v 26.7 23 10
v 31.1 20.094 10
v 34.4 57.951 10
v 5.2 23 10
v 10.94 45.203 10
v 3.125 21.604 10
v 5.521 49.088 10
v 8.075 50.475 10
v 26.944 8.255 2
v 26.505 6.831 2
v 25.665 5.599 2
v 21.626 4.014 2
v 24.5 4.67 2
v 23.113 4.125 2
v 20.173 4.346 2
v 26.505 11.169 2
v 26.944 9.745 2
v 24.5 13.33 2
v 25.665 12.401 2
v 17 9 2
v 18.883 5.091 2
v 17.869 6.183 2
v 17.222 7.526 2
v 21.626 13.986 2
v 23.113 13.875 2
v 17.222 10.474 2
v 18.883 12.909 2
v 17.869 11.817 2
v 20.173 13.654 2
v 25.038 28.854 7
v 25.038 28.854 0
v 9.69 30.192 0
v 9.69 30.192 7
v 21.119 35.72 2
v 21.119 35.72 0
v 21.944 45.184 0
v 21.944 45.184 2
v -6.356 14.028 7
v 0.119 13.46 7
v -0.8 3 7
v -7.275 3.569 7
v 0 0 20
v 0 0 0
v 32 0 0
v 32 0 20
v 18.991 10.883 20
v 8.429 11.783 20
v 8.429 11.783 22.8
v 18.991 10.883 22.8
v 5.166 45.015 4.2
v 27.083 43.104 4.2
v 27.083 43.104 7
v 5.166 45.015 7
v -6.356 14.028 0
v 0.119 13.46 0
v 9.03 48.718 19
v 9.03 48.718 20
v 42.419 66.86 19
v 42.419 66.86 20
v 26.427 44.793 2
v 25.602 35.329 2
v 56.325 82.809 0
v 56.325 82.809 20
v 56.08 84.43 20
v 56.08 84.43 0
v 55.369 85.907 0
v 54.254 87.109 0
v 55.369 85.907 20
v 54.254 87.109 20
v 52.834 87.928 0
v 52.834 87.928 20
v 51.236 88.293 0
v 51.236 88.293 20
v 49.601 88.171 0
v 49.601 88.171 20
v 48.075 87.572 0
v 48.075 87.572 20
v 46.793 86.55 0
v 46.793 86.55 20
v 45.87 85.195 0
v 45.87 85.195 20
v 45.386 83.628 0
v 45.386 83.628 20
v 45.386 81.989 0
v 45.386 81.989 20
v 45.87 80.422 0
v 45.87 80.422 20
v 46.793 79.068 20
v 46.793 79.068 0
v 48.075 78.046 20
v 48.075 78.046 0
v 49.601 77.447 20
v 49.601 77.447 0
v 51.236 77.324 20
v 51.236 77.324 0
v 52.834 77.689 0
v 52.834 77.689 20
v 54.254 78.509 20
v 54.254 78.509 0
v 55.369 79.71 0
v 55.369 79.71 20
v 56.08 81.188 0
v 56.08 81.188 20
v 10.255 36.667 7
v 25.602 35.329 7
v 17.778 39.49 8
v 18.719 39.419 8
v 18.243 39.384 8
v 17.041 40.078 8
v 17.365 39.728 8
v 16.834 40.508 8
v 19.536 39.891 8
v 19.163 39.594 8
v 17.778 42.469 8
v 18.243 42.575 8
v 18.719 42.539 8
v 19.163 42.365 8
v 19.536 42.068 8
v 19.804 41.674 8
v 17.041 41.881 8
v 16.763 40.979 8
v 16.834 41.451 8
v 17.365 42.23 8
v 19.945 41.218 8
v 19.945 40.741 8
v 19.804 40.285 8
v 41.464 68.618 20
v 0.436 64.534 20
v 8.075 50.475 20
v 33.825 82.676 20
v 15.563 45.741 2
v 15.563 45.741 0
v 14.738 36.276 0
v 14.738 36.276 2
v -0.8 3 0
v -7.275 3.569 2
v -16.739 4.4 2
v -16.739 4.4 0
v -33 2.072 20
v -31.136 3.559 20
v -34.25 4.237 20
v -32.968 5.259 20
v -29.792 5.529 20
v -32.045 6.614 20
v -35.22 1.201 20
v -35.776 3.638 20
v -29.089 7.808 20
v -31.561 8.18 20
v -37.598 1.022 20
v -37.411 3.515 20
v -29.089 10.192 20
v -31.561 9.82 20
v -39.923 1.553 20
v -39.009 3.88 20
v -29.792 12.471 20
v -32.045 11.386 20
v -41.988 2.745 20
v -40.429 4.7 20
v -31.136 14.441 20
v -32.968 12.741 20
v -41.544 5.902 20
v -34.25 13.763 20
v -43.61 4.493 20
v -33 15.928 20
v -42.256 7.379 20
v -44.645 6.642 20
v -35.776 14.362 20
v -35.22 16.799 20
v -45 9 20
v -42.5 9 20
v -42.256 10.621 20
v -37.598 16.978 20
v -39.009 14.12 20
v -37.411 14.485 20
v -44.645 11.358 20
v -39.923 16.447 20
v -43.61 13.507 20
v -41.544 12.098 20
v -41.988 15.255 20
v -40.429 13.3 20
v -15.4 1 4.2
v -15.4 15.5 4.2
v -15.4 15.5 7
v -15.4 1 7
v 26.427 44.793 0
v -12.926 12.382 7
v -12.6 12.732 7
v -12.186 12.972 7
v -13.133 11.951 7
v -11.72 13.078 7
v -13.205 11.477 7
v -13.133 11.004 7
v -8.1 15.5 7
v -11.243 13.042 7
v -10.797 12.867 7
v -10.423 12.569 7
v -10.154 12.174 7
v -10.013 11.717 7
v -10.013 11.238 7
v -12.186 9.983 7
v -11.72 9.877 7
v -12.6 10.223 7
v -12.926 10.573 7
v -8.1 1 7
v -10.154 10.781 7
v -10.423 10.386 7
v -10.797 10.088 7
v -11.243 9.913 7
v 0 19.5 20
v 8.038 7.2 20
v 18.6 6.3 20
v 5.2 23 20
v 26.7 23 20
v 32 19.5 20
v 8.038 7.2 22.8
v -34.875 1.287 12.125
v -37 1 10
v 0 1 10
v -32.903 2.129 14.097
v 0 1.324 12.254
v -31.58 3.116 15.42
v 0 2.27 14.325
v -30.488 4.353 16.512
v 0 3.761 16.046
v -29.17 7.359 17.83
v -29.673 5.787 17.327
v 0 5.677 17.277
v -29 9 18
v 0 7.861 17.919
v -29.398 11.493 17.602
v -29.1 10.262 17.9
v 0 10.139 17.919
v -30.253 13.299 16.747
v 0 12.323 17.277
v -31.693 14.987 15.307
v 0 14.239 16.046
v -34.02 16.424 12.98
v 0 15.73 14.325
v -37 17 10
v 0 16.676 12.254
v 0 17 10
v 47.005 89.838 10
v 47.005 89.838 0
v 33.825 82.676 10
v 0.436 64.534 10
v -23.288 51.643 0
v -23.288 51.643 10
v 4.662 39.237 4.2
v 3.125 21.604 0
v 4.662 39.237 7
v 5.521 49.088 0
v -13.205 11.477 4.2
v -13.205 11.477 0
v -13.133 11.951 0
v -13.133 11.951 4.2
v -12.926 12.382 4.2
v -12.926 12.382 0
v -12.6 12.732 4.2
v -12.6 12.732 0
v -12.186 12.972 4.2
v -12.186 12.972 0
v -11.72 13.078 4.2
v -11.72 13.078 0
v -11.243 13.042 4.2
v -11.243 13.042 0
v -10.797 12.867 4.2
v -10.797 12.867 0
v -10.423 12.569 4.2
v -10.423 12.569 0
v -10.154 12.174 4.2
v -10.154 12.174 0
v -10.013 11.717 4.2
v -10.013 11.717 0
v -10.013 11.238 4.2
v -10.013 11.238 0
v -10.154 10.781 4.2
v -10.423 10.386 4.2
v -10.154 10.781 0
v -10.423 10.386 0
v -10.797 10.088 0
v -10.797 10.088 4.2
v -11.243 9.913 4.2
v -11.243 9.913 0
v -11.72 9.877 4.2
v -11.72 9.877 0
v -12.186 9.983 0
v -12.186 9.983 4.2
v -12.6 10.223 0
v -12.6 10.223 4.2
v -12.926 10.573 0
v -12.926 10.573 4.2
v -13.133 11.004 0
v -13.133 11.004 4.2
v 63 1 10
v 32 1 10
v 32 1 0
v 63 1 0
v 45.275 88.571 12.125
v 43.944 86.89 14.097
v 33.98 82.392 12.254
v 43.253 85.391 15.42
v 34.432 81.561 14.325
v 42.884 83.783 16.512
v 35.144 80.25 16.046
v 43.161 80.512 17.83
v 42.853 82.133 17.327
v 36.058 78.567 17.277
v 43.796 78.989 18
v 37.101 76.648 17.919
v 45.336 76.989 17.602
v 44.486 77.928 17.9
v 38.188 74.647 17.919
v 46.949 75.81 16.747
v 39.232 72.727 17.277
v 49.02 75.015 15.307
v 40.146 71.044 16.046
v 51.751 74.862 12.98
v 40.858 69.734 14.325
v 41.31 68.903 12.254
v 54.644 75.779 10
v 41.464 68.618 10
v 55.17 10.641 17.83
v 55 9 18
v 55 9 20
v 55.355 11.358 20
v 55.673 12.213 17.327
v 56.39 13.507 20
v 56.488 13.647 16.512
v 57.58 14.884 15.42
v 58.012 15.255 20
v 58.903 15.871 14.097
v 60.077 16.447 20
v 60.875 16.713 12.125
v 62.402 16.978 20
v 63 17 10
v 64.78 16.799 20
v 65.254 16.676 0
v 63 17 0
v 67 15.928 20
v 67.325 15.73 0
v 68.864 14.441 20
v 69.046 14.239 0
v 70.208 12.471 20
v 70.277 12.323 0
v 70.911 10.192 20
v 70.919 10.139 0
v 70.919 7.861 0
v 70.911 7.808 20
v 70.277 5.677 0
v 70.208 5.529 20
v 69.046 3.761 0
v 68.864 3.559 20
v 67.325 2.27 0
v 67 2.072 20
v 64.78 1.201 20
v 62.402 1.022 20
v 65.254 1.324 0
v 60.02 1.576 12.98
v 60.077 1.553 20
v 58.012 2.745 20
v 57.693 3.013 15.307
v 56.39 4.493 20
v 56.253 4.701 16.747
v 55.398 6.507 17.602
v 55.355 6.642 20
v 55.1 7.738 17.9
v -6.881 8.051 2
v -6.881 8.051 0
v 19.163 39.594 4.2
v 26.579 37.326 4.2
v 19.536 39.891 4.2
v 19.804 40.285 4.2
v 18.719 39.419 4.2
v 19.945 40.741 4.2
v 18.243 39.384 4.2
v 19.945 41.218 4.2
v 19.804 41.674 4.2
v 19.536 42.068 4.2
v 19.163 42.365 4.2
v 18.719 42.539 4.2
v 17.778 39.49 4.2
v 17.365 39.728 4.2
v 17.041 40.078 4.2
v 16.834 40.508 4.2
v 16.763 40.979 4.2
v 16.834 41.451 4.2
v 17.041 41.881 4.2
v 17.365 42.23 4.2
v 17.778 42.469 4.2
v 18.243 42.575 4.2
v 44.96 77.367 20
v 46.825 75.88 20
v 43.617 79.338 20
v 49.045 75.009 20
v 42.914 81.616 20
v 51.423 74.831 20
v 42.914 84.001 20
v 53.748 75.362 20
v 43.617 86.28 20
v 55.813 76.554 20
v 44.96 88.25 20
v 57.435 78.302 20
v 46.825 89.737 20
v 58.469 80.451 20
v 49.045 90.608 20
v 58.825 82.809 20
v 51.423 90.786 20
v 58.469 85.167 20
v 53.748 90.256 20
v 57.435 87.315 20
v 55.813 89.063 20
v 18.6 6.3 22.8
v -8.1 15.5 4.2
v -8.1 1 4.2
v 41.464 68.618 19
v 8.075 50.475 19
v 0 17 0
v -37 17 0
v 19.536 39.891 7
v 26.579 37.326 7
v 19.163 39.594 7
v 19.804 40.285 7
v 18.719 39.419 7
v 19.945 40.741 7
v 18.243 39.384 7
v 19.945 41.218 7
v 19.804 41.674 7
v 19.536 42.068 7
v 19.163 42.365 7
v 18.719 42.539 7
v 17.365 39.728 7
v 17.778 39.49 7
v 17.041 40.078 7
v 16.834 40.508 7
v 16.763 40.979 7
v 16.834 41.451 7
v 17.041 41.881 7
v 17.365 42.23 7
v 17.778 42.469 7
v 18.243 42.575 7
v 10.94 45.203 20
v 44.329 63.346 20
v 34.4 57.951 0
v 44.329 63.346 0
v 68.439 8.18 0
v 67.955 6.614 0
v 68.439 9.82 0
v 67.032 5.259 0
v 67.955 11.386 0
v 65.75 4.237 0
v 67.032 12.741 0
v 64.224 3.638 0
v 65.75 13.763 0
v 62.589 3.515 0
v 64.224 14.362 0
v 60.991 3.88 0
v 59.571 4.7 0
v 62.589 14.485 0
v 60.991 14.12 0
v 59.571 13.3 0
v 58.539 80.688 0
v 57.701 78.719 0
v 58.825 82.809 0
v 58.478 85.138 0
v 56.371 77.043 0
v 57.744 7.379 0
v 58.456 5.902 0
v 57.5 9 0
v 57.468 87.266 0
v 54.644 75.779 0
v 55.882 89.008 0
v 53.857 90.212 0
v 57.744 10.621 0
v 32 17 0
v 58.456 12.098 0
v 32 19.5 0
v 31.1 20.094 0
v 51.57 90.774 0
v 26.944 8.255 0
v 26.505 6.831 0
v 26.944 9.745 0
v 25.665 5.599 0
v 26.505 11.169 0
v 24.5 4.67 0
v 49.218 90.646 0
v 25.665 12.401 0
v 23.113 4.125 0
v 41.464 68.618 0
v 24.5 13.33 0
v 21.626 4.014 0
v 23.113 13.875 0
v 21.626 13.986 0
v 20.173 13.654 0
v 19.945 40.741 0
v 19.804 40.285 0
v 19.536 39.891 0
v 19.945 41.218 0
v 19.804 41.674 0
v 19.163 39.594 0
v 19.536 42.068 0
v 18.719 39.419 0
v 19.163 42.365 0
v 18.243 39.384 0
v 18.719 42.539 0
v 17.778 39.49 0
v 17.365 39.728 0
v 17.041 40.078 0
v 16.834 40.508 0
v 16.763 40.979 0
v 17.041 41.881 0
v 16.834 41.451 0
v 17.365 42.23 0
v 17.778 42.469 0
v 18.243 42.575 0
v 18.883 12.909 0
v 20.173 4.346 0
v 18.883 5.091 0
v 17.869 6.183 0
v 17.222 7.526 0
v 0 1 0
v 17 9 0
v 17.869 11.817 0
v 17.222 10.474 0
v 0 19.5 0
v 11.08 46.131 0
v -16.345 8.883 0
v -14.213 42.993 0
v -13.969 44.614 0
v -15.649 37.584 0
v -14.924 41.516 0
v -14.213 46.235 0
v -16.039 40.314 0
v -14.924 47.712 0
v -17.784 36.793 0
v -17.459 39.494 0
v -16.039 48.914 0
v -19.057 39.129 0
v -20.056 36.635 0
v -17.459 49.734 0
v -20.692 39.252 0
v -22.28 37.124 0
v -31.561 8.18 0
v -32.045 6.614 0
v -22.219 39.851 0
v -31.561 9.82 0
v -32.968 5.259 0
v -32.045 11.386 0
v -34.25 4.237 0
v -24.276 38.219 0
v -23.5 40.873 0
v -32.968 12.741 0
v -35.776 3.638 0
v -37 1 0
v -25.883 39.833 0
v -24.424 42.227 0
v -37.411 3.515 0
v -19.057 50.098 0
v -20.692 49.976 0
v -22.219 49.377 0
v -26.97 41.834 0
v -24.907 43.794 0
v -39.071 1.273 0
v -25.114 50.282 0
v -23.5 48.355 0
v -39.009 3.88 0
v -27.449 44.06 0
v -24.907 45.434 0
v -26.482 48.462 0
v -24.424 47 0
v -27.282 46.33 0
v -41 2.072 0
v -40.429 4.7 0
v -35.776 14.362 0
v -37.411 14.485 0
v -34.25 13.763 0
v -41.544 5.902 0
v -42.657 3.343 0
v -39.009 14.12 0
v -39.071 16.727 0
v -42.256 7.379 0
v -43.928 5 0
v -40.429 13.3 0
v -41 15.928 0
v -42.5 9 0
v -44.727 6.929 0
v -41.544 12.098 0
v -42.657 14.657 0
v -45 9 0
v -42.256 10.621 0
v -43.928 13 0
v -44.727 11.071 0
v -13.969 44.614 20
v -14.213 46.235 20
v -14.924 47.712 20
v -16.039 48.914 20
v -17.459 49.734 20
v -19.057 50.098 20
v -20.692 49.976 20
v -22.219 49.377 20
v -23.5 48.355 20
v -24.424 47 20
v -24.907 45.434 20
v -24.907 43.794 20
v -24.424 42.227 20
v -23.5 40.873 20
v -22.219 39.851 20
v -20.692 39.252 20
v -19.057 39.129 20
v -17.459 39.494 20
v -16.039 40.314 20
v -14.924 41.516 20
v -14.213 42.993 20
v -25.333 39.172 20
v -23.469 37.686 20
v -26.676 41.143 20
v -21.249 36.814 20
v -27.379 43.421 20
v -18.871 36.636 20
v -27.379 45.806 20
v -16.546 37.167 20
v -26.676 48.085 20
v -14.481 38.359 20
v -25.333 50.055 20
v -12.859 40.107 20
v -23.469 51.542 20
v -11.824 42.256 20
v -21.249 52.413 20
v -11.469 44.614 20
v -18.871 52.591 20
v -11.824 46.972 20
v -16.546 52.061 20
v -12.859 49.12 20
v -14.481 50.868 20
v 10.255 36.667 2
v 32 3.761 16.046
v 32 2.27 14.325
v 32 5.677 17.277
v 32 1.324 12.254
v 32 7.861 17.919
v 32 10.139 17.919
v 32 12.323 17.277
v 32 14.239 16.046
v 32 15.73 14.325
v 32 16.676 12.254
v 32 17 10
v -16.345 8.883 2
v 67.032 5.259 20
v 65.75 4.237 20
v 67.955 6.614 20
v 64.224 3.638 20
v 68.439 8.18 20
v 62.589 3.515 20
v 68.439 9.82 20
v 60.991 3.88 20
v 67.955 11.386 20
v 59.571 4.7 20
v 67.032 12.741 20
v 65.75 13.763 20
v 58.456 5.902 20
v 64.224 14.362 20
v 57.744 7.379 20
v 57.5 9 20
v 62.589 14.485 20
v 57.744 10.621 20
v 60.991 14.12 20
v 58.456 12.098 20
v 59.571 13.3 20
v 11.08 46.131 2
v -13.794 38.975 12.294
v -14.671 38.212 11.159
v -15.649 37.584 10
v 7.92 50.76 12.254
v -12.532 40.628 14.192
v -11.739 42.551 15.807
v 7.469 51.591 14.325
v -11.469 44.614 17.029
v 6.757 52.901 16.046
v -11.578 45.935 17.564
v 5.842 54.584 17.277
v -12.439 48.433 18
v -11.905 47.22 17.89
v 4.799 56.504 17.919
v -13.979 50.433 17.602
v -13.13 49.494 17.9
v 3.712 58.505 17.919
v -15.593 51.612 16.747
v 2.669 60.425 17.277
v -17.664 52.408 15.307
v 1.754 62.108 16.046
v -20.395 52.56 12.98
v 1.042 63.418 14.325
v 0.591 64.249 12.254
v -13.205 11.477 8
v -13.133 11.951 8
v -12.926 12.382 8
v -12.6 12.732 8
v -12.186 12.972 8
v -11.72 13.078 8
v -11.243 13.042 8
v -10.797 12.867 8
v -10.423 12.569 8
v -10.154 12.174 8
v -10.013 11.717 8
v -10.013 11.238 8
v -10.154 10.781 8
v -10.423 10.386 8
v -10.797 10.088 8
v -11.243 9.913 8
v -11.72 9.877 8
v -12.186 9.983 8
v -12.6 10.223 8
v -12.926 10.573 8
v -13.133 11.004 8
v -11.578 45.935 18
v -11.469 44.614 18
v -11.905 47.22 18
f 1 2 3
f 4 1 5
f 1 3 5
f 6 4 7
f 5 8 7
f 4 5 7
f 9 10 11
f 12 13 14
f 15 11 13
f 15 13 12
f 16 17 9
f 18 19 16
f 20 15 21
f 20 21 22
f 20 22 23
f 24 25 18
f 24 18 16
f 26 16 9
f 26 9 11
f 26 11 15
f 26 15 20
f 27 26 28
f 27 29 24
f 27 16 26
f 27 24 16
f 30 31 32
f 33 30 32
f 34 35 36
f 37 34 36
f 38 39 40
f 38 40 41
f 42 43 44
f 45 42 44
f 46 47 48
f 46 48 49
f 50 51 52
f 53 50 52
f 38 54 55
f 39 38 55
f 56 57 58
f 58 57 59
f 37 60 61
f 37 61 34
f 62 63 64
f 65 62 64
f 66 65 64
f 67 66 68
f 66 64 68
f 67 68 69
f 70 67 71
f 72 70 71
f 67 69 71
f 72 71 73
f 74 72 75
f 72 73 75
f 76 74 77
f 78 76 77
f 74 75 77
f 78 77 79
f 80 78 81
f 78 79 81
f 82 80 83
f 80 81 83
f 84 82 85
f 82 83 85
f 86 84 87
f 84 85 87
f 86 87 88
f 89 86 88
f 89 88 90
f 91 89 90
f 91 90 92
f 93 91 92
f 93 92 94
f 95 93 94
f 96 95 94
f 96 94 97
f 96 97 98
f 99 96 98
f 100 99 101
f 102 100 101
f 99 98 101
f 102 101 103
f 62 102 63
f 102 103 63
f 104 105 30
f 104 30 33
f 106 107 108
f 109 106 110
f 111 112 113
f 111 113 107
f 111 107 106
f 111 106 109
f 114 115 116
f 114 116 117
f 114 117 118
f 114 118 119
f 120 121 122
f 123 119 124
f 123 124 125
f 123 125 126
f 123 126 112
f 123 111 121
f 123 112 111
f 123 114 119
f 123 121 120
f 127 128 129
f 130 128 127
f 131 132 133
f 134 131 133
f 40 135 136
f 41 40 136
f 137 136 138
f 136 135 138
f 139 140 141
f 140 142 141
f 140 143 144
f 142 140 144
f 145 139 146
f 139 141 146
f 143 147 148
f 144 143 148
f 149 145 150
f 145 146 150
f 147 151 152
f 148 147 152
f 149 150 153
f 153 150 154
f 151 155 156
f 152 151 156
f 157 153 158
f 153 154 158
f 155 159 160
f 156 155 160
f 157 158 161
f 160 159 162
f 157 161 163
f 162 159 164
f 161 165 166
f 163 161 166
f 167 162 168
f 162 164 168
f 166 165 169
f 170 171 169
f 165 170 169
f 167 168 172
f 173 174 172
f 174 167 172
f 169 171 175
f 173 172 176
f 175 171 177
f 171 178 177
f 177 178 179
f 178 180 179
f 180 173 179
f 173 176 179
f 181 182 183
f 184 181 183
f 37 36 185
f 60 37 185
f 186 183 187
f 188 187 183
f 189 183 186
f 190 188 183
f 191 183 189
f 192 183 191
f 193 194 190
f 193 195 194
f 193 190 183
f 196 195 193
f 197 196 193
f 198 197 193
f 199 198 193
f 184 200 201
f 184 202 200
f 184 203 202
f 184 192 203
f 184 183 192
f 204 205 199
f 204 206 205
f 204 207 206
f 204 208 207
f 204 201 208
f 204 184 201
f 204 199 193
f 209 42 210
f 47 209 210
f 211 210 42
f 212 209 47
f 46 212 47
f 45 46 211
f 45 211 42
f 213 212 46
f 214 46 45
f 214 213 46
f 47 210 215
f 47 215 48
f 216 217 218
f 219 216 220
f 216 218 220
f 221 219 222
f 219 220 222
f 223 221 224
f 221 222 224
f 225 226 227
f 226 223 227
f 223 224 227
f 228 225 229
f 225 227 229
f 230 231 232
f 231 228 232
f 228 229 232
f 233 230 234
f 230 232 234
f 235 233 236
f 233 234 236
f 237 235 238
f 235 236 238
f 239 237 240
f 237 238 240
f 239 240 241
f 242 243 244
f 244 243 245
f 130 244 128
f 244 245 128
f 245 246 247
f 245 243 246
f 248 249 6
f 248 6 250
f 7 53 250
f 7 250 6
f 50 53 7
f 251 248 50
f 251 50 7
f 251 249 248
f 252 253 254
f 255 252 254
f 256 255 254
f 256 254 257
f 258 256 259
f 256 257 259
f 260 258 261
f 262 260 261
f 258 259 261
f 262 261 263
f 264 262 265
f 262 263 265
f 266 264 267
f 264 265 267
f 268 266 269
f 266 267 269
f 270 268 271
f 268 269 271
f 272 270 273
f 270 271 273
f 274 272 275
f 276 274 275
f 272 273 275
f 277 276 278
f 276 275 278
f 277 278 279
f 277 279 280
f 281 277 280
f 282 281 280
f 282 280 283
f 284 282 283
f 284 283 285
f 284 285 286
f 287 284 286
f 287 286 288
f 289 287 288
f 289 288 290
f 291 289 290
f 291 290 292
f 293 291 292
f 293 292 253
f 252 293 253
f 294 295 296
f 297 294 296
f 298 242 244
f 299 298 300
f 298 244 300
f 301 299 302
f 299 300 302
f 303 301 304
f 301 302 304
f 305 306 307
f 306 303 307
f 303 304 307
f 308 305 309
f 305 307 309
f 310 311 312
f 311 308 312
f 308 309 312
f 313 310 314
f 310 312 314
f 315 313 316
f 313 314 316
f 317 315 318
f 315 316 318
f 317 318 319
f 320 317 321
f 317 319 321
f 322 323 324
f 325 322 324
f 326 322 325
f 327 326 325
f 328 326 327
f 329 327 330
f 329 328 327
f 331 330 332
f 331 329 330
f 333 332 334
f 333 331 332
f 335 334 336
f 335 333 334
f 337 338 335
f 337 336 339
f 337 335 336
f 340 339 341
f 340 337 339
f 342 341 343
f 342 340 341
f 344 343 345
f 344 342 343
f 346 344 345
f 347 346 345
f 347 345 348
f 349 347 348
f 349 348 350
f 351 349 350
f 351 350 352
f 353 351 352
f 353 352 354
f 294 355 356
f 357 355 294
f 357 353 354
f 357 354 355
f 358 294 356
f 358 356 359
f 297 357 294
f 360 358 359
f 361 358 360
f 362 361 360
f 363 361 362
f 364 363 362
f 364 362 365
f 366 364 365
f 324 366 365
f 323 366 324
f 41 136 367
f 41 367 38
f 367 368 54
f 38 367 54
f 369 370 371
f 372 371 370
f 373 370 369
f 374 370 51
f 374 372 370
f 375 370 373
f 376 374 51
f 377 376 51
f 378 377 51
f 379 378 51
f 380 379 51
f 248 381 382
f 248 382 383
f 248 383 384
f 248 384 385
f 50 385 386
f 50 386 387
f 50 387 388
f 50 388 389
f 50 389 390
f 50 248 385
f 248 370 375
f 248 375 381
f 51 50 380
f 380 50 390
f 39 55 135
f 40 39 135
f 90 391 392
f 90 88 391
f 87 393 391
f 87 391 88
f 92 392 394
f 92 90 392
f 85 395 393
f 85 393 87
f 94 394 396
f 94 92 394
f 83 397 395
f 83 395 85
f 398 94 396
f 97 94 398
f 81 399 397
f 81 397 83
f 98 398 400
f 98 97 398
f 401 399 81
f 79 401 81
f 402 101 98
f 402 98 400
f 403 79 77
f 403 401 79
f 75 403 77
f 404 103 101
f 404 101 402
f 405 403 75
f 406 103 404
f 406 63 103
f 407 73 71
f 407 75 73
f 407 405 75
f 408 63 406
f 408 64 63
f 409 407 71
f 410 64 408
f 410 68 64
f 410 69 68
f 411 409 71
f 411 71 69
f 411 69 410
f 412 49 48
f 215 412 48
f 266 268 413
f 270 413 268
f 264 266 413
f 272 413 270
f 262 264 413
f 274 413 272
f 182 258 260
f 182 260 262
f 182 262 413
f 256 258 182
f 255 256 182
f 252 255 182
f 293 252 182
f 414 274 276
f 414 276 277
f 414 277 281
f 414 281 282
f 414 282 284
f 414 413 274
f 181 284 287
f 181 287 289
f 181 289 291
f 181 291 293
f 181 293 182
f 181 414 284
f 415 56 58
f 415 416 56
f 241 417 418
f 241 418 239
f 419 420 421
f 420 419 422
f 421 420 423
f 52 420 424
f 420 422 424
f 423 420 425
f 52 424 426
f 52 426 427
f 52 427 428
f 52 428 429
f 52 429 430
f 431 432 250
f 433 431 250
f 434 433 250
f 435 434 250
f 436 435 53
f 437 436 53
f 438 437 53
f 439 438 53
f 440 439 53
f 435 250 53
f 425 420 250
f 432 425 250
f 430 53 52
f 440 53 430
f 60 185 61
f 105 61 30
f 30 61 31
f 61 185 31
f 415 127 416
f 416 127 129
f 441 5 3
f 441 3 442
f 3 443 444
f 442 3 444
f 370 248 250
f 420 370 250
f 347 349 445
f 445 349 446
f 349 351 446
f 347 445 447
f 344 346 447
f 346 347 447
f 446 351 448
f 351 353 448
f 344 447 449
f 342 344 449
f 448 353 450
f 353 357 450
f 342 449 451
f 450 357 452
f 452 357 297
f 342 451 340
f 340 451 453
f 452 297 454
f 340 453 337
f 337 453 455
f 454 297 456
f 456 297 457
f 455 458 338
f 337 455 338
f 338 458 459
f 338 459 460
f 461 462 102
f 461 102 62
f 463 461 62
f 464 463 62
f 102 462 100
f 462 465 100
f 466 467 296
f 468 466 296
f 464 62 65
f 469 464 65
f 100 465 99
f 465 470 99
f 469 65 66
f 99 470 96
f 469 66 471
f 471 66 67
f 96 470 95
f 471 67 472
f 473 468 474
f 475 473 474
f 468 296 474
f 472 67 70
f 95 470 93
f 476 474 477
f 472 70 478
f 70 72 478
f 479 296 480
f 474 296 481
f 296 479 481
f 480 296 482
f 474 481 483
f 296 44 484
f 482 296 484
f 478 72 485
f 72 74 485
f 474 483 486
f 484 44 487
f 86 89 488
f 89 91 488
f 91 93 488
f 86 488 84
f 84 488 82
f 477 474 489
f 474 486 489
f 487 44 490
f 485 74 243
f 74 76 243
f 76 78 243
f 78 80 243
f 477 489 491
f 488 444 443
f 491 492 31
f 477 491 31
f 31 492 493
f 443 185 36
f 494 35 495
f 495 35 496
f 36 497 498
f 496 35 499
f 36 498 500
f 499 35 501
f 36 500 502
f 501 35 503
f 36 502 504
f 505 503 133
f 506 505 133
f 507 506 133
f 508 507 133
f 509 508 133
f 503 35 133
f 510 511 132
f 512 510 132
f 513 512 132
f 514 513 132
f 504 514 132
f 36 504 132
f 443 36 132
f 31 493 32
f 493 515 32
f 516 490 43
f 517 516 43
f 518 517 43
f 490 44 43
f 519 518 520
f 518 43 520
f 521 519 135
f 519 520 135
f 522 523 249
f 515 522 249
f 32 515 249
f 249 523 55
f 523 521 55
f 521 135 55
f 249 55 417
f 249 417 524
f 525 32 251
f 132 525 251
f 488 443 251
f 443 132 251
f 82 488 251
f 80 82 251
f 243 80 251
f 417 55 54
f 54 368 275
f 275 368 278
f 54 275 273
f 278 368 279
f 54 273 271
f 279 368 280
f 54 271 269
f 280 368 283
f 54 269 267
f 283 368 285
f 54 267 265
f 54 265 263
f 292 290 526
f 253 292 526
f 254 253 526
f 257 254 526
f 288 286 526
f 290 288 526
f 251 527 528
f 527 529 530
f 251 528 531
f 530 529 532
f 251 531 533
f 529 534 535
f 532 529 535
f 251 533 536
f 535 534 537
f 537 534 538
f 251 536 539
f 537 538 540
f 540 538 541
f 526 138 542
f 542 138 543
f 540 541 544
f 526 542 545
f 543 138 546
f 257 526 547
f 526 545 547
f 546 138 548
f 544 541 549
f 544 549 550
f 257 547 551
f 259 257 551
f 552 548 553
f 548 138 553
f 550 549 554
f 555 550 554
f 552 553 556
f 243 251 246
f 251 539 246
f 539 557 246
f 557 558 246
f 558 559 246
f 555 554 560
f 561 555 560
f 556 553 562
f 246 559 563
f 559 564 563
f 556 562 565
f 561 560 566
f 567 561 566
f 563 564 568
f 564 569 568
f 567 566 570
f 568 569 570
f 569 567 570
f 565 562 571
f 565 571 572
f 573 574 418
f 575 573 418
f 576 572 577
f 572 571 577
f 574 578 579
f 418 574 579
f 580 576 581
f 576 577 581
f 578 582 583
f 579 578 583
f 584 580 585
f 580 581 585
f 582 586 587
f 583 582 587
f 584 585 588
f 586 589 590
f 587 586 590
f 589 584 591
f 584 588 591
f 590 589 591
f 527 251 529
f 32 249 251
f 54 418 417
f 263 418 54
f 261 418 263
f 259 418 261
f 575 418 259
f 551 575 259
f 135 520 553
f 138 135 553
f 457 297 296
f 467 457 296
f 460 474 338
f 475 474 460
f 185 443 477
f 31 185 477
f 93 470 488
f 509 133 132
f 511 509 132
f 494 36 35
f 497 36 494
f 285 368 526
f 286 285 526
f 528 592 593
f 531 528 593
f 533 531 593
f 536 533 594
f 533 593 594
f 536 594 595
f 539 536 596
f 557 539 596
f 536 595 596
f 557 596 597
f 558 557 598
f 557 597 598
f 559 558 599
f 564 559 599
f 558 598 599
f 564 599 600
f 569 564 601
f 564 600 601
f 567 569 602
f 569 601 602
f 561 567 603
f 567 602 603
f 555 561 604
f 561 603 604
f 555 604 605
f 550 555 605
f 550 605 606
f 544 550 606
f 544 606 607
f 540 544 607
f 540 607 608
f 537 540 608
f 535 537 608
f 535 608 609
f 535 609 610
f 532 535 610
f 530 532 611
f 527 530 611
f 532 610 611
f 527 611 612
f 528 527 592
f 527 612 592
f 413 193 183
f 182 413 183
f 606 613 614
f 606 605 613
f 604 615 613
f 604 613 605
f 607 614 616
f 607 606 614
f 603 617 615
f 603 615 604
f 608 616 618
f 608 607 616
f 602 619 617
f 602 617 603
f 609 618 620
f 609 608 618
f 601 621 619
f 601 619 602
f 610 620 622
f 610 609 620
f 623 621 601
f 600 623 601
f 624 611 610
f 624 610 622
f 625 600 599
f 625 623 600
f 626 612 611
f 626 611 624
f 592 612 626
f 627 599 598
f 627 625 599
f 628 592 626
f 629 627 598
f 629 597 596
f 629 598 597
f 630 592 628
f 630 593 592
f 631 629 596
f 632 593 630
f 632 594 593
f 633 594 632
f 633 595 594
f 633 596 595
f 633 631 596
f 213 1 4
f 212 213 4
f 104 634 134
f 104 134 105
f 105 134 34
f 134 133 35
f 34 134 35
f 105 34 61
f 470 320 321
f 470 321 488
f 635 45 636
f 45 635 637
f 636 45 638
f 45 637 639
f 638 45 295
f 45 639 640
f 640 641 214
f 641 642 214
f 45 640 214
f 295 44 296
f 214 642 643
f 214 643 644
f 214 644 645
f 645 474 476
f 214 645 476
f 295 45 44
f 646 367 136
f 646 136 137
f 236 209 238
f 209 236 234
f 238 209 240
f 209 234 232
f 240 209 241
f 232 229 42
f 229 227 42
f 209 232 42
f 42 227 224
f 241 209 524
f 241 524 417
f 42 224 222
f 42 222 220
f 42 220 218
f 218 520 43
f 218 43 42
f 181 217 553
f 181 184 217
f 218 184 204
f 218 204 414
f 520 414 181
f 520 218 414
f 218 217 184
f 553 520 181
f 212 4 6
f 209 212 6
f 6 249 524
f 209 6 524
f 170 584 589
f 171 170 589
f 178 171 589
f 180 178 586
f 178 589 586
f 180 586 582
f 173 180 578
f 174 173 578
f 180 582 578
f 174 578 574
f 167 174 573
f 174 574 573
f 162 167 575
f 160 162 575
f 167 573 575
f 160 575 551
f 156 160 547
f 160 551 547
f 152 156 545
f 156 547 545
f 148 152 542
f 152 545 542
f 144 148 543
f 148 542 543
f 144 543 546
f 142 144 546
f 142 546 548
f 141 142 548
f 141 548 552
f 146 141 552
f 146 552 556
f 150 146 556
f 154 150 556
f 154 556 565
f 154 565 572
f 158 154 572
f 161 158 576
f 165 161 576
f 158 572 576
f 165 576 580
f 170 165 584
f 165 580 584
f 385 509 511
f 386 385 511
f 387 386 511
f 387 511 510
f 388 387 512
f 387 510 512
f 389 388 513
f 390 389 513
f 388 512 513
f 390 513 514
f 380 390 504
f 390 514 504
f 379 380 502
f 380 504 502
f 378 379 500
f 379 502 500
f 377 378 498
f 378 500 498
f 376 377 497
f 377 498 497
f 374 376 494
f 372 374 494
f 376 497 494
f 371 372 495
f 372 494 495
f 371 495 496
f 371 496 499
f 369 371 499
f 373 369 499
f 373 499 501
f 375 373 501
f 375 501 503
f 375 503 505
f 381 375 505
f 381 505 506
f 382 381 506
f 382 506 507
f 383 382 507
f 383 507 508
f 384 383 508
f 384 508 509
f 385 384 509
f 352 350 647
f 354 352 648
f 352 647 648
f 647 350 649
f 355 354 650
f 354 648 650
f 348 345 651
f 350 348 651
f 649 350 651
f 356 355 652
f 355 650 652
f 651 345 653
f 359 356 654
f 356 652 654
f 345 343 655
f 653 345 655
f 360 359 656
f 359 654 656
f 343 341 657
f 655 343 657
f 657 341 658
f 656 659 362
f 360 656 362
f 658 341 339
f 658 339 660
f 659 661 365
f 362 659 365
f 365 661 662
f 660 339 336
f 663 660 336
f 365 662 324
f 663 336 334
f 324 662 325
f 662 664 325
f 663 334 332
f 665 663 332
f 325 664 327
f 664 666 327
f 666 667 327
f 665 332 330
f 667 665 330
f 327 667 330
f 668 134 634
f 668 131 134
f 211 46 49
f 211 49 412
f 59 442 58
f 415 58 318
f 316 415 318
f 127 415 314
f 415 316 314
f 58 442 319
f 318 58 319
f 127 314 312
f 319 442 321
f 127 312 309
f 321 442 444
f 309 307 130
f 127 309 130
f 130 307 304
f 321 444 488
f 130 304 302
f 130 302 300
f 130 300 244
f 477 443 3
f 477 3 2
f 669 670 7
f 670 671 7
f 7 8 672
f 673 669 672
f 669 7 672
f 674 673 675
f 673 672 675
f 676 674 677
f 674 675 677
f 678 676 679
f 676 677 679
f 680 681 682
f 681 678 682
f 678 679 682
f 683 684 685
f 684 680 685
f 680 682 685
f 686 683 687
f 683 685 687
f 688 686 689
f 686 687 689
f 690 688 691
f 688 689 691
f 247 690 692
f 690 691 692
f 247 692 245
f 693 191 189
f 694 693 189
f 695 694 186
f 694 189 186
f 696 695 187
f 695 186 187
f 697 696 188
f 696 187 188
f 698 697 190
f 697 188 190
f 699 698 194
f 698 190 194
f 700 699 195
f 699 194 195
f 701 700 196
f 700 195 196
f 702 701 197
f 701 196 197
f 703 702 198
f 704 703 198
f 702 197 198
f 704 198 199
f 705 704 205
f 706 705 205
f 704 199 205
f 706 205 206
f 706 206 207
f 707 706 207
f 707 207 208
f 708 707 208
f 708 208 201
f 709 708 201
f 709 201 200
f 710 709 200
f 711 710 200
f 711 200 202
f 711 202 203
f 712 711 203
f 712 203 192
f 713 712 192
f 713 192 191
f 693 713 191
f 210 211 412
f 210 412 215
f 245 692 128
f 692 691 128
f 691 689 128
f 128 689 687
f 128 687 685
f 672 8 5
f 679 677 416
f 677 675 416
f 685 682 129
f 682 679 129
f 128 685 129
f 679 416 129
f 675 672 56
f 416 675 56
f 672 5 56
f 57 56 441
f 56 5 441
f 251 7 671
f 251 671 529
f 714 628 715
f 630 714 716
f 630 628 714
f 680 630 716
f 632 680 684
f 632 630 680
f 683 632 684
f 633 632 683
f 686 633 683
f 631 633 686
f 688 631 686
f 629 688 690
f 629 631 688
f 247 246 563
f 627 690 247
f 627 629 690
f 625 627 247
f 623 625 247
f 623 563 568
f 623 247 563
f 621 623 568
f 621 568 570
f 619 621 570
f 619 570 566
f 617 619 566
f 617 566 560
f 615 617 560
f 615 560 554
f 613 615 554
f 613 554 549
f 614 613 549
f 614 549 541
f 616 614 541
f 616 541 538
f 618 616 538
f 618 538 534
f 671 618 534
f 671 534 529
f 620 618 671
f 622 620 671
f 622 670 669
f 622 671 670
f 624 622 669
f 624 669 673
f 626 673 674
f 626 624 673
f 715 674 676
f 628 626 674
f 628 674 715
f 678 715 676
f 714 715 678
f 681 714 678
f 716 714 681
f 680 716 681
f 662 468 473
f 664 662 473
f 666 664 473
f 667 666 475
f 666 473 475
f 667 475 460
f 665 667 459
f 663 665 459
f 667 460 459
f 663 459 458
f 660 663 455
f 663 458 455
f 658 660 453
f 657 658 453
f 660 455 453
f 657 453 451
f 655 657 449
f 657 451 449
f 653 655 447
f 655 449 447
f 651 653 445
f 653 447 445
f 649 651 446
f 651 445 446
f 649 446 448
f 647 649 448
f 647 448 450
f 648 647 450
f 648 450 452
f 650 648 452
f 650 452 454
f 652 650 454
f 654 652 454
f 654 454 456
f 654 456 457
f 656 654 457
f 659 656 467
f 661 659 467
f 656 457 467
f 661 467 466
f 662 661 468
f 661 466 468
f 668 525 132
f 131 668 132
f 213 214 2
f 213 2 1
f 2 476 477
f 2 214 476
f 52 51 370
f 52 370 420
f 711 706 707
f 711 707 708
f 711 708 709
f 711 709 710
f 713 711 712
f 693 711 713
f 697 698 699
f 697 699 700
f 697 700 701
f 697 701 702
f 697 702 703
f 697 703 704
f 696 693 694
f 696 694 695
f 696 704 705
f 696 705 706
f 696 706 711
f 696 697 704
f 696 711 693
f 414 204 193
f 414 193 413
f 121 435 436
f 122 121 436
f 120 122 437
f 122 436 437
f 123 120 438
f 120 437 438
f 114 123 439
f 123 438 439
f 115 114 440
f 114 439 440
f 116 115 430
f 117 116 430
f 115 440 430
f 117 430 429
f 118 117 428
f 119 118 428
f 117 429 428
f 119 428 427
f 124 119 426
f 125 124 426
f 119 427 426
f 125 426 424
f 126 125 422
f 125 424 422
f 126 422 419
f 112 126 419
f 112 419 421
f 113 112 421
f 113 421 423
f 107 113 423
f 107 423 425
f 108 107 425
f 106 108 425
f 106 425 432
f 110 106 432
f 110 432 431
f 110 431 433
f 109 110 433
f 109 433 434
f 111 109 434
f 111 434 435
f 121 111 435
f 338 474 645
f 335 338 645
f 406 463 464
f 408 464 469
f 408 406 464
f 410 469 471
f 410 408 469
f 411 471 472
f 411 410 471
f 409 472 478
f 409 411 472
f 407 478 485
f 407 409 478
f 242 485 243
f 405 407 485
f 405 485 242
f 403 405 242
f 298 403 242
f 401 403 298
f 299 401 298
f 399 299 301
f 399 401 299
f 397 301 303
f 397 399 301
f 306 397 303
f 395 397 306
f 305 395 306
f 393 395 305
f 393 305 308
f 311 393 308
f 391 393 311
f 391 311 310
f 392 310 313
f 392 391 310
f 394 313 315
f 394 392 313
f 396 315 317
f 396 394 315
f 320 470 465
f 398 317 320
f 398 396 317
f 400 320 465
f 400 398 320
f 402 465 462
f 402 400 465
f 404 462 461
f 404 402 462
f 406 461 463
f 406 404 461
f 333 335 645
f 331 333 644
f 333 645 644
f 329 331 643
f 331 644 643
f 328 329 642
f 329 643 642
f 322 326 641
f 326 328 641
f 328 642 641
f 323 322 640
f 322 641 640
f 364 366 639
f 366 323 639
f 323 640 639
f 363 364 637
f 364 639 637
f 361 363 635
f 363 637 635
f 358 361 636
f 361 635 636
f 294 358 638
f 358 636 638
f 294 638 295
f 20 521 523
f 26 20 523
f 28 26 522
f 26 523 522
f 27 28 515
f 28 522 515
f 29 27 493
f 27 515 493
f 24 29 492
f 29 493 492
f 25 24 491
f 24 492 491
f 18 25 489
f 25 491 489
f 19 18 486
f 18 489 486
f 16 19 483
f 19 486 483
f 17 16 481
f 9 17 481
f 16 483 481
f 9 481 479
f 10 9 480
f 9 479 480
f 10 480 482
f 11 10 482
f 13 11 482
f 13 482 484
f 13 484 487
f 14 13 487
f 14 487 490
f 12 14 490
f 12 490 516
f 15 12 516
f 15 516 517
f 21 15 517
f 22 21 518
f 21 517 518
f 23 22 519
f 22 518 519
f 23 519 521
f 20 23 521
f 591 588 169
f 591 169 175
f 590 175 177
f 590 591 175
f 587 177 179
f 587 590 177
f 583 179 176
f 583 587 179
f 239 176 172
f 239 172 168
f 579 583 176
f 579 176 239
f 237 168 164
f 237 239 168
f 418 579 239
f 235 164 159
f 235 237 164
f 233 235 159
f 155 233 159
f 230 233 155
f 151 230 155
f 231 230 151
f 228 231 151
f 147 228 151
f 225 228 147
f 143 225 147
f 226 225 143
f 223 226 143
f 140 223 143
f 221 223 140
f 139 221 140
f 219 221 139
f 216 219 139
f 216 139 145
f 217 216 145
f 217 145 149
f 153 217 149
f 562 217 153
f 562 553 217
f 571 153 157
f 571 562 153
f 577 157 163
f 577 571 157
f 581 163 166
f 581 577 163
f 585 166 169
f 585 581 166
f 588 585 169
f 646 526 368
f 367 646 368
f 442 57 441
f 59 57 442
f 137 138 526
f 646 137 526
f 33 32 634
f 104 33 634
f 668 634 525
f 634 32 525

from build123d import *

# Parameters (mm, degrees)
BOSS_EXTRUDE1_DEPTH      = 20
SKETCH2_R                = 8.000000000000012
SKETCH2_R_2              = 5.5000000000000036
BOSS_EXTRUDE2_DEPTH      = 20
SKETCH2_R_3              = 7.999999999999998
SKETCH2_R_4              = 5.4999999999999964
BOSS_EXTRUDE2_2_DEPTH    = 20
BOSS_EXTRUDE3_REACH      = 84.813
BOSS_EXTRUDE3_END_RADIUS = 8.000000000000012
BOSS_EXTRUDE4_REACH      = 79.266
BOSS_EXTRUDE4_END_RADIUS = 7.999999999999998
BOSS_EXTRUDE5_DEPTH      = 10
BOSS_EXTRUDE6_DEPTH      = 20
SKETCH7_R                = 8
SKETCH7_R_2              = 5.499999999999997
BOSS_EXTRUDE7_DEPTH      = 20
SKETCH7_R_3              = 8.000000000000002
SKETCH7_R_4              = 5.500000000000001
BOSS_EXTRUDE7_2_DEPTH    = 20
BOSS_EXTRUDE8_REACH      = 108.8
BOSS_EXTRUDE8_END_RADIUS = 8.000000000000002
BOSS_EXTRUDE9_REACH      = 124.193
BOSS_EXTRUDE9_END_RADIUS = 8
FILLET1_R                = 8
CUT_EXTRUDE1_DEPTH       = 1
BOSS_EXTRUDE10_DEPTH     = 2.8000000000000003
SKETCH12_R               = 5.000000000000001
CUT_EXTRUDE2_DEPTH       = 2
CUT_EXTRUDE3_DEPTH       = 6.999999999999999
CUT_EXTRUDE4_DEPTH       = 2
SKETCH12_7_R             = 1.6049758304520296
SKETCH12_7_R_2           = 1.6000000000000008
CUT_EXTRUDE5_DEPTH       = 8
SKETCH13_W               = 2.8000000000000007
SKETCH13_H               = 5.799999999999997
CUT_EXTRUDE6_DEPTH       = 22.000000000000004
CUT_EXTRUDE7_DEPTH       = 14.499999999999998
CUT_EXTRUDE8_DEPTH       = 14.5


with BuildPart() as part:
    # Sketch1 → Boss-Extrude1 (new body)
    with BuildSketch(Plane.XY):
        Polygon((0, 0), (32, 0), (32, 19.5), (26.699999999999996, 23), (5.2, 22.999999999999996), (-9e-17, 19.5), align=None)
    extrude(amount=BOSS_EXTRUDE1_DEPTH)



with BuildPart() as body_2:
    # Sketch2 → Boss-Extrude2 (new body)
    with BuildSketch(Plane(origin=(0, 0, 0), x_dir=(-1, 0, 0), z_dir=(0, 0, -1))):
        with Locations((-63, 8.999999999999982)):
            Circle(SKETCH2_R)
        with Locations((-63, 8.999999999999982)):
            Circle(SKETCH2_R_2, mode=Mode.SUBTRACT)
    extrude(amount=-BOSS_EXTRUDE2_DEPTH)


with BuildPart() as body_3:
    # Sketch2 → Boss-Extrude2 2 (new body)
    with BuildSketch(Plane(origin=(0, 0, 0), x_dir=(-1, 0, 0), z_dir=(0, 0, -1))):
        with Locations((37.00000000000001, 9.000000000000002)):
            Circle(SKETCH2_R_3)
        with Locations((37.00000000000001, 9.000000000000002)):
            Circle(SKETCH2_R_4, mode=Mode.SUBTRACT)
    extrude(amount=-BOSS_EXTRUDE2_2_DEPTH)


with BuildPart() as part_1:
    add(part.part)

    add(body_2.part)  # Boss-Extrude3 merges body 2
    # Boss-Extrude3: up to this cylinder (the profile starts outside it)
    boss_extrude3_end = Plane(origin=(63, 8.999999999999982, 9), z_dir=(0, 0, -1)) * Cylinder(BOSS_EXTRUDE3_END_RADIUS, 186.62600000000003, mode=Mode.PRIVATE)
    # Sketch4 → Boss-Extrude3 (add, up to the surface)
    with BuildSketch(Plane(origin=(32, 0, 0), x_dir=(0, 0, -1), z_dir=(1, 0, 0)), mode=Mode.PRIVATE) as boss_extrude3_sk1:
        Polygon((0, 17), (-18.000000000000004, 16.999999999999996), (-18, 0.9999999999999974), (2.03e-15, 0.9999999999999996), align=None)
    boss_extrude3_tool1 = extrude(boss_extrude3_sk1.sketch, amount=BOSS_EXTRUDE3_REACH, mode=Mode.PRIVATE) - boss_extrude3_end
    add(boss_extrude3_tool1.solids().sort_by_distance((32, 9, 9))[0])


    add(body_3.part)  # Boss-Extrude4 merges body 3
    # Boss-Extrude4: up to this cylinder (the profile starts outside it)
    boss_extrude4_end = Plane(origin=(-37.00000000000001, 9.000000000000002, 9), z_dir=(0, 0, -1)) * Cylinder(BOSS_EXTRUDE4_END_RADIUS, 175.532, mode=Mode.PRIVATE)
    # Sketch5 → Boss-Extrude4 (add, up to the surface)
    with BuildSketch(Plane.ZY, mode=Mode.PRIVATE) as boss_extrude4_sk1:
        Polygon((0, 17), (18.000000000000004, 17), (18.000000000000007, 1.0000000000000009), (1.96e-15, 1.0000000000000009), align=None)
    boss_extrude4_tool1 = extrude(boss_extrude4_sk1.sketch, amount=BOSS_EXTRUDE4_REACH, mode=Mode.PRIVATE) - boss_extrude4_end
    add(boss_extrude4_tool1.solids().sort_by_distance((0, 9, 9))[0])

    # Sketch6 → Boss-Extrude5 (add)
    with BuildSketch(Plane(origin=(0, 0, 0), x_dir=(-1, 0, 0), z_dir=(0, 0, -1))):
        Polygon((-34.39999999999999, 57.95077896920448), (-31.099999999999998, 20.09433962264151), (-26.699999999999996, 23), (-5.2, 22.999999999999996), (-3.1253837694695172, 21.603623690989096), (-5.978502136601586, 54.33359411944373), (-10.939595247933246, 45.203253371300974), align=None)
    extrude(amount=-BOSS_EXTRUDE5_DEPTH)

    # Sketch6<3> → Boss-Extrude6 (add)
    with BuildSketch(Plane(origin=(0, 0, 0), x_dir=(-1, 0, 0), z_dir=(0, 0, -1))):
        Polygon((-0.4360161035932989, 64.53392395352827), (-10.939595247933246, 45.203253371300974), (-44.328935344507634, 63.34579916606999), (-33.82535620016769, 82.67646974829727), align=None)
    extrude(amount=-BOSS_EXTRUDE6_DEPTH)



with BuildPart() as body_2_2:
    # Sketch7 → Boss-Extrude7 (new body)
    with BuildSketch(Plane.XY.offset(20)):
        with Locations((50.82484219508264, 82.80866622590094)):
            Circle(SKETCH7_R)
        with Locations((50.82484219508264, 82.80866622590094)):
            Circle(SKETCH7_R_2, mode=Mode.SUBTRACT)
    extrude(amount=-BOSS_EXTRUDE7_DEPTH)


with BuildPart() as body_3_2:
    # Sketch7 → Boss-Extrude7 2 (new body)
    with BuildSketch(Plane.XY.offset(20)):
        with Locations((-19.46850537665293, 44.613832973755706)):
            Circle(SKETCH7_R_3)
        with Locations((-19.46850537665293, 44.613832973755706)):
            Circle(SKETCH7_R_4, mode=Mode.SUBTRACT)
    extrude(amount=-BOSS_EXTRUDE7_2_DEPTH)


with BuildPart() as part_2:
    add(part_1.part)

    add(body_3_2.part)  # Boss-Extrude8 merges body 3 2
    # Boss-Extrude8: up to this cylinder (the profile starts outside it)
    boss_extrude8_end = Plane(origin=(-19.46850537665293, 44.613832973755706, 9), z_dir=(0, 0, 1)) * Cylinder(BOSS_EXTRUDE8_END_RADIUS, 234.6, mode=Mode.PRIVATE)
    # Sketch8 → Boss-Extrude8 (add, up to the surface)
    with BuildSketch(Plane(origin=(27.409040149935237, 14.89306960462748, 0), x_dir=(0, 0, 1), z_dir=(-0.8786668446466945, -0.47743541565181535, 0)), mode=Mode.PRIVATE) as boss_extrude8_sk1:
        Polygon((0, 56.49564980326649), (18.000000000000004, 56.49564980326649), (18.000000000000007, 40.49564980326649), (1.65e-15, 40.49564980326649), align=None)
    boss_extrude8_tool1 = extrude(boss_extrude8_sk1.sketch, amount=BOSS_EXTRUDE8_REACH, mode=Mode.PRIVATE) - boss_extrude8_end
    add(boss_extrude8_tool1.solids().sort_by_distance((4.255499, 57.504589, 9))[0])


    add(body_2_2.part)  # Boss-Extrude9 merges body 2 2
    # Boss-Extrude9: up to this cylinder (the profile starts outside it)
    boss_extrude9_end = Plane(origin=(50.82484219508264, 82.80866622590094, 9), z_dir=(0, 0, 1)) * Cylinder(BOSS_EXTRUDE9_END_RADIUS, 265.38599999999997, mode=Mode.PRIVATE)
    # Sketch9 → Boss-Extrude9 (add, up to the surface)
    with BuildSketch(Plane(origin=(60.79838024650963, 33.03561539939651, 0), x_dir=(0, 0, -1), z_dir=(0.8786668446466942, 0.47743541565181585, 0)), mode=Mode.PRIVATE) as boss_extrude9_sk1:
        Polygon((0, 56.49564980326643), (-18.000000000000004, 56.49564980326643), (-18, 40.49564980326643), (1.96e-15, 40.49564980326643), align=None)
    boss_extrude9_tool1 = extrude(boss_extrude9_sk1.sketch, amount=BOSS_EXTRUDE9_REACH, mode=Mode.PRIVATE) - boss_extrude9_end
    add(boss_extrude9_tool1.solids().sort_by_distance((37.64484, 75.647135, 9))[0])

    # Fillet1
    # the kernel refuses this fillet: 8 mm, written as the material it takes off along each edge
    with BuildSketch(Plane(origin=(32, 0.9999999999999974, 18), x_dir=(0, 1e-16, -1), z_dir=(1, 0, 0))) as fillet1_piece_1_section:
        with BuildLine():
            CenterArc((FILLET1_R, FILLET1_R), FILLET1_R, 180, 90)
            Line((7.8e-16, FILLET1_R), (0, 0))
            Line((0, 0), (FILLET1_R, 0))
        make_face()
    fillet1_piece_1 = extrude(amount=51, mode=Mode.PRIVATE)
    fillet1_piece_1 = fillet1_piece_1 - Plane(origin=(63, 8.999999999999982, 16.146124278615087), x_dir=(-1, 0, 0), z_dir=(0, 0, -1)) * Cylinder(8.000000000000012, 134, mode=Mode.PRIVATE)
    add(fillet1_piece_1, mode=Mode.SUBTRACT)
    with BuildSketch(Plane(origin=(32, 16.999999999999996, 18.000000000000004), x_dir=(0, 0, -1), z_dir=(1, 0, 0))) as fillet1_piece_2_section:
        with BuildLine():
            CenterArc((FILLET1_R, -FILLET1_R), FILLET1_R, 90.00000000000001, 89.99999999999999)
            Line((3.55e-15, -FILLET1_R), (0, 0))
            Line((0, 0), (FILLET1_R, 0))
        make_face()
    fillet1_piece_2 = extrude(amount=51, mode=Mode.PRIVATE)
    fillet1_piece_2 = fillet1_piece_2 - Plane(origin=(63, 8.999999999999982, 16.146124278615446), x_dir=(-1, 0, 0), z_dir=(0, 0, -1)) * Cylinder(8.000000000000012, 134, mode=Mode.PRIVATE)
    add(fillet1_piece_2, mode=Mode.SUBTRACT)
    with BuildSketch(Plane(origin=(41.464322850596744, 68.61780023395015, 18), x_dir=(0, 0, -1), z_dir=(0.8786668446466942, 0.47743541565181585, 0))) as fillet1_piece_3_section:
        with BuildLine():
            CenterArc((FILLET1_R, FILLET1_R), FILLET1_R, 180.00000000000009, 89.99999999999989)
            Line((-3.55e-15, FILLET1_R), (0, 0))
            Line((0, 0), (FILLET1_R, 0))
        make_face()
    fillet1_piece_3 = extrude(amount=35, mode=Mode.PRIVATE)
    fillet1_piece_3 = fillet1_piece_3 - Plane(origin=(50.82484219508264, 82.80866622590094, 16.04484502768724), x_dir=(1, 0, 0), z_dir=(0, 0, 1)) * Cylinder(8, 102, mode=Mode.PRIVATE)
    add(fillet1_piece_3, mode=Mode.SUBTRACT)
    with BuildSketch(Plane(origin=(33.82535620016769, 82.67646974829725, 18.000000000000004), x_dir=(0.47743541565181585, -0.8786668446466942, 0), z_dir=(0.8786668446466942, 0.47743541565181585, 0))) as fillet1_piece_4_section:
        with BuildLine():
            CenterArc((FILLET1_R, FILLET1_R), FILLET1_R, 180, 90)
            Line((6.95e-15, FILLET1_R), (0, 0))
            Line((0, 0), (FILLET1_R, 0))
        make_face()
    fillet1_piece_4 = extrude(amount=35.00000000000005, mode=Mode.PRIVATE)
    fillet1_piece_4 = fillet1_piece_4 - Plane(origin=(50.82484219508264, 82.80866622590094, 16.044845027687604), x_dir=(1, 0, 0), z_dir=(0, 0, 1)) * Cylinder(8, 103, mode=Mode.PRIVATE)
    add(fillet1_piece_4, mode=Mode.SUBTRACT)
    with BuildSketch(Plane(origin=(0.4360161035932997, 64.5339239535283, 18.000000000000004), x_dir=(1.28e-15, -2.35e-15, -1), z_dir=(-0.8786668446466945, -0.47743541565181535, 0))) as fillet1_piece_5_section:
        with BuildLine():
            CenterArc((FILLET1_R, FILLET1_R), FILLET1_R, 180, 89.99999999999983)
            Line((1.784e-14, FILLET1_R), (0, 0))
            Line((0, 0), (FILLET1_R, 0))
        make_face()
    fillet1_piece_5 = extrude(amount=47.00000000000002, mode=Mode.PRIVATE)
    fillet1_piece_5 = fillet1_piece_5 - Plane(origin=(-19.46850537665293, 44.613832973755706, 16.13426416613262), x_dir=(1, 0, 0), z_dir=(0, 0, 1)) * Cylinder(8.000000000000002, 127, mode=Mode.PRIVATE)
    add(fillet1_piece_5, mode=Mode.SUBTRACT)
    with BuildSketch(Plane(origin=(8.074982754022347, 50.47525443918118, 18.000000000000007), x_dir=(-0.47743541565181535, 0.8786668446466944, 0), z_dir=(-0.8786668446466945, -0.47743541565181535, 0))) as fillet1_piece_6_section:
        with BuildLine():
            CenterArc((FILLET1_R, FILLET1_R), FILLET1_R, 180, 90)
            Line((-7.94e-15, FILLET1_R), (0, 0))
            Line((0, 0), (FILLET1_R, 0))
        make_face()
    fillet1_piece_6 = extrude(amount=47.00000000000002, mode=Mode.PRIVATE)
    fillet1_piece_6 = fillet1_piece_6 - Plane(origin=(-19.46850537665293, 44.613832973755706, 15.757082069038027), x_dir=(1, 0, 0), z_dir=(0, 0, 1)) * Cylinder(8.000000000000002, 127, mode=Mode.PRIVATE)
    add(fillet1_piece_6, mode=Mode.SUBTRACT)
    with BuildSketch(Plane(origin=(0, 1.0000000000000009, 18.000000000000007), x_dir=(0, -1.1e-16, -1), z_dir=(-1, 0, 0))) as fillet1_piece_7_section:
        with BuildLine():
            CenterArc((FILLET1_R, -FILLET1_R), FILLET1_R, 90, 90)
            Line((-8.9e-16, -FILLET1_R), (0, 0))
            Line((0, 0), (FILLET1_R, 0))
        make_face()
    fillet1_piece_7 = extrude(amount=57.00000000000002, mode=Mode.PRIVATE)
    fillet1_piece_7 = fillet1_piece_7 - Plane(origin=(-37.00000000000001, 9.000000000000002, 16.158452965658498), x_dir=(-1, 0, 0), z_dir=(0, 0, -1)) * Cylinder(7.999999999999998, 147, mode=Mode.PRIVATE)
    add(fillet1_piece_7, mode=Mode.SUBTRACT)
    with BuildSketch(Plane(origin=(-8e-17, 17, 18.000000000000004), x_dir=(0, 0, -1), z_dir=(-1, 0, 0))) as fillet1_piece_8_section:
        with BuildLine():
            CenterArc((FILLET1_R, FILLET1_R), FILLET1_R, 180.00000000000003, 90)
            Line((-3.55e-15, FILLET1_R), (0, 0))
            Line((0, 0), (FILLET1_R, 0))
        make_face()
    fillet1_piece_8 = extrude(amount=57.00000000000001, mode=Mode.PRIVATE)
    fillet1_piece_8 = fillet1_piece_8 - Plane(origin=(-37.00000000000001, 9.000000000000002, 16.1584529656595), x_dir=(-1, 0, 0), z_dir=(0, 0, -1)) * Cylinder(7.999999999999998, 146, mode=Mode.PRIVATE)
    add(fillet1_piece_8, mode=Mode.SUBTRACT)

    # Sketch10 → Cut-Extrude1 (cut)
    with BuildSketch(Plane.XY.offset(20)):
        Polygon((9.02985358532597, 48.71792074988778), (42.41919368190036, 66.86046654465682), (41.46432285059673, 68.6178002339502), (8.074982754022338, 50.47525443918117), align=None)
    extrude(amount=-CUT_EXTRUDE1_DEPTH, mode=Mode.SUBTRACT)

    # Sketch11 → Boss-Extrude10 (add)
    with BuildSketch(Plane.XY.offset(20)):
        Polygon((18.99056603773585, 10.883389375796833), (18.599999999999998, 6.3), (8.038276655772503, 7.2), (8.428842693508352, 11.78338937579684), align=None)
    extrude(amount=BOSS_EXTRUDE10_DEPTH)

    # Sketch12 → Cut-Extrude2 (cut)
    with BuildSketch(Plane(origin=(0, 0, 0), x_dir=(-1, 0, 0), z_dir=(0, 0, -1))):
        with Locations((-22, 9.000000000000002)):
            Circle(SKETCH12_R)
    extrude(amount=-CUT_EXTRUDE2_DEPTH, mode=Mode.SUBTRACT)

    # Sketch12<4> → Cut-Extrude3 (cut)
    with BuildSketch(Plane(origin=(0, 0, 0), x_dir=(-1, 0, 0), z_dir=(0, 0, -1))):
        Polygon((6.356319377041451, 14.028477455220814), (-0.11875000000000302, 13.459727455220813), (0.800000000000002, 3.0000000000000018), (7.275069377041458, 3.568750000000003), (6.8813193770414545, 8.051490337951781), align=None)
        Polygon((-25.602268748509772, 35.32933063302242), (-25.037795064299242, 28.85388706058404), (-9.69009760065465, 30.191767814935158), (-10.254571284865174, 36.66721138737354), (-14.737570681168684, 36.27642191368933), (-21.119269352206267, 35.72012010670664), align=None)
    extrude(amount=-CUT_EXTRUDE3_DEPTH, mode=Mode.SUBTRACT)

    # Sketch12<6> → Cut-Extrude4 (cut)
    with BuildSketch(Plane(origin=(0, 0, 0), x_dir=(-1, 0, 0), z_dir=(0, 0, -1))):
        Polygon((6.8813193770414545, 8.051490337951781), (7.275069377041457, 3.5687500000000023), (16.73863231271742, 4.400000000000003), (16.34488231271742, 8.882740337951782), align=None)
        Polygon((-14.737570681168684, 36.27642191368933), (-10.254571284865174, 36.66721138737354), (-11.079571284865175, 46.13132122401429), (-15.562570681168683, 45.740531750330085), align=None)
        Polygon((-26.427268748509782, 44.79344046966318), (-25.602268748509772, 35.32933063302242), (-21.119269352206267, 35.72012010670663), (-21.944269352206273, 45.18422994334738), align=None)
    extrude(amount=-CUT_EXTRUDE4_DEPTH, mode=Mode.SUBTRACT)

    # Sketch12<7> → Cut-Extrude5 (cut)
    with BuildSketch(Plane(origin=(0, 0, 0), x_dir=(-1, 0, 0), z_dir=(0, 0, -1))):
        with Locations((11.59964197476565, 11.4774838965863)):
            Circle(SKETCH12_7_R)
        with Locations((-18.362630543003274, 40.979381450535236)):
            Circle(SKETCH12_7_R_2)
    extrude(amount=-CUT_EXTRUDE5_DEPTH, mode=Mode.SUBTRACT)

    # Sketch13 → Cut-Extrude6 (cut)
    with BuildSketch(Plane(origin=(1.232797121271193, -0.10746468950636484, 0), x_dir=(0, 0, 1), z_dir=(-0.9962220880674463, 0.0868421052631576, 0))):
        with Locations((5.6000000000000005, 42.39342200955655)):
            Rectangle(SKETCH13_W, SKETCH13_H)
    extrude(amount=-CUT_EXTRUDE6_DEPTH, mode=Mode.SUBTRACT)

    # Sketch14 → Cut-Extrude7 (cut)
    with BuildSketch(Plane.XZ.offset(-1.0000000000000009)):
        Polygon((-15.399999999999999, 7), (-9.600000000000001, 7), (-9.6, 4.2), (-15.399999999999999, 4.2), align=None)
    extrude(amount=-CUT_EXTRUDE7_DEPTH, mode=Mode.SUBTRACT)

    # Sketch15 → Cut-Extrude8 (cut)
    with BuildSketch(Plane.XZ.offset(-1.0000000000000009)):
        Polygon((-9.600000000000001, 7), (-8.100000000000001, 7), (-8.100000000000001, 4.2), (-9.6, 4.2), align=None)
    extrude(amount=-CUT_EXTRUDE8_DEPTH, mode=Mode.SUBTRACT)


solid = part_2.part
